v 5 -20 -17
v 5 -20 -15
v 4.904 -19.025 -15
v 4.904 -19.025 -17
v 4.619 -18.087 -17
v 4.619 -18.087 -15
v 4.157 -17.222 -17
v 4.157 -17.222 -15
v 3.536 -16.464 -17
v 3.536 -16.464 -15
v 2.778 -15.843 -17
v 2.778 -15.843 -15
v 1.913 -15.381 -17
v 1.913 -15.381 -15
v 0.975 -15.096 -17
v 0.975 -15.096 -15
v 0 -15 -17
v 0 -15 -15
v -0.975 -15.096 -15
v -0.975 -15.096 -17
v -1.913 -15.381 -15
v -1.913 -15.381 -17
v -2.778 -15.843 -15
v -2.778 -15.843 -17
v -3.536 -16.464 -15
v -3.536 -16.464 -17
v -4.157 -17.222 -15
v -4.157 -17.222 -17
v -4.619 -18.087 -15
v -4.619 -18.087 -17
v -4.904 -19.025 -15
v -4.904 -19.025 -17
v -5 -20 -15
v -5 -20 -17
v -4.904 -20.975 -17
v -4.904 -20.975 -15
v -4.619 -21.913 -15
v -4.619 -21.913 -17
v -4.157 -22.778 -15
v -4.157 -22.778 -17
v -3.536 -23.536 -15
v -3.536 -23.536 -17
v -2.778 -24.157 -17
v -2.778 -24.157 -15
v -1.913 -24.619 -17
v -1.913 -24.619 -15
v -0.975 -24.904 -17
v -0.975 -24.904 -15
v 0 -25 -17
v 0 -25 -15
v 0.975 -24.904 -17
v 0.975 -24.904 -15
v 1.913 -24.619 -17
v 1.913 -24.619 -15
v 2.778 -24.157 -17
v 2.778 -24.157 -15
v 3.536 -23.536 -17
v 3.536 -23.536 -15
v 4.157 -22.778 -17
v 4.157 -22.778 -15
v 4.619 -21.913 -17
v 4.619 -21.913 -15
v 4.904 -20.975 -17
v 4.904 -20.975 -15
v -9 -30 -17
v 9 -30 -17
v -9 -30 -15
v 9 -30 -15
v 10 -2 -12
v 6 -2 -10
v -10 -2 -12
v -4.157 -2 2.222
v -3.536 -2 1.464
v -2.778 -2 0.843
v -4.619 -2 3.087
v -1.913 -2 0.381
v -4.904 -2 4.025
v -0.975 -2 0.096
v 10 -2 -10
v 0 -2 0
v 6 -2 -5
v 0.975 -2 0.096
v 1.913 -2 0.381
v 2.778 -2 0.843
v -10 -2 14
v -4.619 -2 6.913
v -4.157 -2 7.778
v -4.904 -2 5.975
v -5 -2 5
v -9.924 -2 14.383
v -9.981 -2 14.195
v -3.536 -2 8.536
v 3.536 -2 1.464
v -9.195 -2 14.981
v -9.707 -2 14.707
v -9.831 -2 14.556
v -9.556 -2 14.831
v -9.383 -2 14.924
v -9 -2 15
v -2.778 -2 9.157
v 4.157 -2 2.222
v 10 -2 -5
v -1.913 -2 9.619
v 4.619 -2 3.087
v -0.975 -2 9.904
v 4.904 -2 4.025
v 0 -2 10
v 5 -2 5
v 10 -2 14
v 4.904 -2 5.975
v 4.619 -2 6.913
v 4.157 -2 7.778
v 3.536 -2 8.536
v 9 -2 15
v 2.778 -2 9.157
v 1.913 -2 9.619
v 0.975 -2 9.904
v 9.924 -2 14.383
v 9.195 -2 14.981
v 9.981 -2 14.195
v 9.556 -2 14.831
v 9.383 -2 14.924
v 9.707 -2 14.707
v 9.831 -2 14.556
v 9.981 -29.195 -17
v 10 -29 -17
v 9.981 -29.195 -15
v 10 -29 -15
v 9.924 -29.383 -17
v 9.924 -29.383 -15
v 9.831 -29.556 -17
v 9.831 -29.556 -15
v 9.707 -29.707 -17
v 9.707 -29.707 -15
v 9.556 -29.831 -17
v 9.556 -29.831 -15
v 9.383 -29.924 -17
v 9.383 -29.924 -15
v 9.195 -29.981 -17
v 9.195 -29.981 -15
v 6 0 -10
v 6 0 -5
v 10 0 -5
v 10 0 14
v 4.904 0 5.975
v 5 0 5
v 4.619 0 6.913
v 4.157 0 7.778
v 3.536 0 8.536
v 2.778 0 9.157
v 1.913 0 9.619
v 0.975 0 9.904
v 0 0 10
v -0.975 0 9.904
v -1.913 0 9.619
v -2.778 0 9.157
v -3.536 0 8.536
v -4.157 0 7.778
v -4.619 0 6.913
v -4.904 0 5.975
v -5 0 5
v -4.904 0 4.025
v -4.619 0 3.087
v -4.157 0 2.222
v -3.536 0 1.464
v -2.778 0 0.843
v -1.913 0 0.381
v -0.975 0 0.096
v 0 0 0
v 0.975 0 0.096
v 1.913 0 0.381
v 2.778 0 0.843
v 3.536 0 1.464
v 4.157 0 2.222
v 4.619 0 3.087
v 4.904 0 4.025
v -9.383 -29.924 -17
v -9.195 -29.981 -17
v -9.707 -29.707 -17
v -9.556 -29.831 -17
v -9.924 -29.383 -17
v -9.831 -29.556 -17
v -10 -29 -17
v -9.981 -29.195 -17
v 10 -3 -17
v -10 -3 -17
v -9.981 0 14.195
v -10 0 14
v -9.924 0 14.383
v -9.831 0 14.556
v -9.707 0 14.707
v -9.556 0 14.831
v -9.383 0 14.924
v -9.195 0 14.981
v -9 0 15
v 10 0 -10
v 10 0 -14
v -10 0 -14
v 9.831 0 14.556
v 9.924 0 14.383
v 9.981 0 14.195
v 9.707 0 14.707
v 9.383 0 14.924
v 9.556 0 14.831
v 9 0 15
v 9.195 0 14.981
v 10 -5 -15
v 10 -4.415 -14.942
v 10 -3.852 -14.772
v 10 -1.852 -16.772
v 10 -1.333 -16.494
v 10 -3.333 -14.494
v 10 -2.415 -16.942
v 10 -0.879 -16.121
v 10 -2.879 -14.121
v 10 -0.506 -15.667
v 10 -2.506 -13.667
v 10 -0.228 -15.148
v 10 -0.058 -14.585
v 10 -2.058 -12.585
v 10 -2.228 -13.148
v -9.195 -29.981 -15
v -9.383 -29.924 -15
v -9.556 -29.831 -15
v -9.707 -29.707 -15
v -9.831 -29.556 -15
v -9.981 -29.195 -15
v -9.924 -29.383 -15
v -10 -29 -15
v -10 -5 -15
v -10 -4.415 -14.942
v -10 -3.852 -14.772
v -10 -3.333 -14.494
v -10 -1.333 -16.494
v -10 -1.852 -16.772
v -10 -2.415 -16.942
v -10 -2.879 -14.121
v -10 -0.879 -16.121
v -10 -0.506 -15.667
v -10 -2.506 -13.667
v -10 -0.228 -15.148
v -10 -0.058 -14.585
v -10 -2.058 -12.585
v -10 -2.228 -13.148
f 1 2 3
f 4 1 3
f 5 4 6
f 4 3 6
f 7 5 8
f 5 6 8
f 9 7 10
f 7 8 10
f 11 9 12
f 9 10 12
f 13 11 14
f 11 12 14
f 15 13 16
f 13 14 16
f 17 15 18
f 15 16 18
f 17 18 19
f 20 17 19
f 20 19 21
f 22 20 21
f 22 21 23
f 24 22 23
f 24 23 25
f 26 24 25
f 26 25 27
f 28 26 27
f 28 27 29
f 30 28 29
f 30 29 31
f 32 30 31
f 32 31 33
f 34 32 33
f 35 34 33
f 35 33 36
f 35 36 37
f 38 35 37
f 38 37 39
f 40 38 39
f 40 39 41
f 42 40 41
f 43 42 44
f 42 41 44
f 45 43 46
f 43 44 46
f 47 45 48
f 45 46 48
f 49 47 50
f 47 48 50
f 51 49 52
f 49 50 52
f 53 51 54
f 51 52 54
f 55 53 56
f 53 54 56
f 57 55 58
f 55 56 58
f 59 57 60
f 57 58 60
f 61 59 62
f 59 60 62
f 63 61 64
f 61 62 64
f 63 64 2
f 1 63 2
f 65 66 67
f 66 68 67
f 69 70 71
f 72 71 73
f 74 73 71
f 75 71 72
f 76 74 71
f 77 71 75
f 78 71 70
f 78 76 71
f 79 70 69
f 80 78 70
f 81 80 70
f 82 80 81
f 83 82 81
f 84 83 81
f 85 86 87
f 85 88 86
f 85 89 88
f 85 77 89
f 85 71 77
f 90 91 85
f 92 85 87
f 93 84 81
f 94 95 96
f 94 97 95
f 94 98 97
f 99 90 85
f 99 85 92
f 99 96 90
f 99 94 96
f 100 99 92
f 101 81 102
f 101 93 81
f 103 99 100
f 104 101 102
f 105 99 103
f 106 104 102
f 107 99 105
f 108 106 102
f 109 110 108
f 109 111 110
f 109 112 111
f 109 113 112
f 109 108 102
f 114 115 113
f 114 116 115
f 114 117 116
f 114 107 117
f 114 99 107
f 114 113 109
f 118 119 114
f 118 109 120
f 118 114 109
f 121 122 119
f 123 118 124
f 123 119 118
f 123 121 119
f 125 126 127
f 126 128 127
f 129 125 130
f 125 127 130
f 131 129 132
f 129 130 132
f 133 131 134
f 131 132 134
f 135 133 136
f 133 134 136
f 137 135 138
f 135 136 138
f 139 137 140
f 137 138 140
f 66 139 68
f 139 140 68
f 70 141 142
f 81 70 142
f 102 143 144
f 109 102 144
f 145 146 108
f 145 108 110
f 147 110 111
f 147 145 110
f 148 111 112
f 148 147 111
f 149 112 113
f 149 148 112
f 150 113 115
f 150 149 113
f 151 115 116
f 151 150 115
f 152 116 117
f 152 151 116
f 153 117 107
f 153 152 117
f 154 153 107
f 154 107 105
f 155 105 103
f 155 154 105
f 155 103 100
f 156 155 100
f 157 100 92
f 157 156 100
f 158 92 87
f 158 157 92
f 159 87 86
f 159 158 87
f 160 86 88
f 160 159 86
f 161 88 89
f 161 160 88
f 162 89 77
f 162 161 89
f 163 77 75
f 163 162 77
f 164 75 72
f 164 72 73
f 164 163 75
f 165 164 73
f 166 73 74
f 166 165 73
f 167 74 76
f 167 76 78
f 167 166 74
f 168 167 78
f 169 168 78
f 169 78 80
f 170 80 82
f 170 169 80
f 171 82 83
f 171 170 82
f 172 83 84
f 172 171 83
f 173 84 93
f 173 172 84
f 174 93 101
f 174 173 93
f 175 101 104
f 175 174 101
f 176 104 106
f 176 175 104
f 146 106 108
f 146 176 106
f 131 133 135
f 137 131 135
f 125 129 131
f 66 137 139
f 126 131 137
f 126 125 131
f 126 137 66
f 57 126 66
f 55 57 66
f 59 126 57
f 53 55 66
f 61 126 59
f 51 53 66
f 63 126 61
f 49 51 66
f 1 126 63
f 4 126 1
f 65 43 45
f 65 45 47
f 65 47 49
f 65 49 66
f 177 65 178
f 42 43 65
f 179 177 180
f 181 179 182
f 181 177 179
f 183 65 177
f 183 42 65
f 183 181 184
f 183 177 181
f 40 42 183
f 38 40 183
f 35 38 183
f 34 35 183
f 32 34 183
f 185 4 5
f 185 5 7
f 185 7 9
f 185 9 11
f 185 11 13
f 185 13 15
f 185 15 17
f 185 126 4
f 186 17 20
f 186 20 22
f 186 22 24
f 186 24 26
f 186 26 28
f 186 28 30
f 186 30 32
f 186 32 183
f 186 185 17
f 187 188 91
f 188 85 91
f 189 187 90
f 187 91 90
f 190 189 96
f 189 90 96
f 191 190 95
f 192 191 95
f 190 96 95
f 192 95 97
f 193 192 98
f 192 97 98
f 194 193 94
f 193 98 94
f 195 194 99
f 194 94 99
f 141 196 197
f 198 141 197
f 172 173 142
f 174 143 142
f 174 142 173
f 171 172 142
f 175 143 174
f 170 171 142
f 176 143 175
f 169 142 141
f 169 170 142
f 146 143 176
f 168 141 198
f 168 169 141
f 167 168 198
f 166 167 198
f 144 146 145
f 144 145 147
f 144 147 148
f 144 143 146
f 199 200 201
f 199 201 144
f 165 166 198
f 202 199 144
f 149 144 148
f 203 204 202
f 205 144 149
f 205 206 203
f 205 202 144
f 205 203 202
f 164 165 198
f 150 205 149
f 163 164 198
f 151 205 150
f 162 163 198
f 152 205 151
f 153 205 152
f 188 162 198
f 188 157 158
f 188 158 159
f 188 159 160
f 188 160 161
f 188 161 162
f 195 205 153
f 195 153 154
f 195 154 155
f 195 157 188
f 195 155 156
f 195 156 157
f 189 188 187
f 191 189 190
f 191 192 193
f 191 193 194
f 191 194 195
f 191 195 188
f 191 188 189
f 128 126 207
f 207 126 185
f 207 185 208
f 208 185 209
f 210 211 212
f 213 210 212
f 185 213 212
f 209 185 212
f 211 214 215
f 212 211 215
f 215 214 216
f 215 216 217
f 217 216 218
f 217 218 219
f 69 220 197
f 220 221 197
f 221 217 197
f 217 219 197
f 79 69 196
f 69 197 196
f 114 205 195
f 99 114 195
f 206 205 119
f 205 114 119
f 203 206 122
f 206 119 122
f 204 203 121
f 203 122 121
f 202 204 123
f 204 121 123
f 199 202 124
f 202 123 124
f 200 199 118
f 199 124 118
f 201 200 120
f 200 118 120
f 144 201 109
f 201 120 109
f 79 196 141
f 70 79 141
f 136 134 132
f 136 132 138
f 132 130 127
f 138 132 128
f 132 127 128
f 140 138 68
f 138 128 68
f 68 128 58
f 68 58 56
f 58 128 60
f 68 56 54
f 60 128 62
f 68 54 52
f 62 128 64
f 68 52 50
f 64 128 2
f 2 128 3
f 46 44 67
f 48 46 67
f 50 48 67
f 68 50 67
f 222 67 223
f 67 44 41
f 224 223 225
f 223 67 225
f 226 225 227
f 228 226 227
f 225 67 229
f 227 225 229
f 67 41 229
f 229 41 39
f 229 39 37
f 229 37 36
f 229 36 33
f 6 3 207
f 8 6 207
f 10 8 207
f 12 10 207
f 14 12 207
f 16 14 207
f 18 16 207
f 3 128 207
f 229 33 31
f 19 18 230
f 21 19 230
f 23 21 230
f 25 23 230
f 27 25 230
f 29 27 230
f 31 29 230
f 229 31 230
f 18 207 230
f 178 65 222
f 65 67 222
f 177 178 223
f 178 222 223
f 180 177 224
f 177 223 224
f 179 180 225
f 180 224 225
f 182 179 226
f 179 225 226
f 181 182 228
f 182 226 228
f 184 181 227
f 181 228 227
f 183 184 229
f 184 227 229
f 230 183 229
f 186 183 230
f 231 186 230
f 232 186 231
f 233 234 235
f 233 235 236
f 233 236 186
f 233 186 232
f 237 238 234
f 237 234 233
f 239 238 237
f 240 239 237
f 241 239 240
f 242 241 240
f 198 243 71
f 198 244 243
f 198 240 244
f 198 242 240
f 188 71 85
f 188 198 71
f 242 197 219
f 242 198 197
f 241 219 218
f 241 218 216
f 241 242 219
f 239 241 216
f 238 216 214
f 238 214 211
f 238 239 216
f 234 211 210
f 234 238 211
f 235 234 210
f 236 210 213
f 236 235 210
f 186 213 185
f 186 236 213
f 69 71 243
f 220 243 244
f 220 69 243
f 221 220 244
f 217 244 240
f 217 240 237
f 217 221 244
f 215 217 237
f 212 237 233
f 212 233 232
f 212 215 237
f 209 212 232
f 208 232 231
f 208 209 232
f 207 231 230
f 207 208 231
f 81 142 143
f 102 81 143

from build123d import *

# Parameters (mm, degrees)
F0_R     = 5
F1_DEPTH = 2
F2_W     = 20
F2_H     = 2
F3_DEPTH = 30
F4_R     = 3
F5_R     = 5
F6_DEPTH = 2.001
F7_R     = 1


with BuildPart() as f1:
    # F0 (on Front) → F1 (new body)
    with BuildSketch(Plane.XZ):
        Polygon((10, 15), (-10, 15), (-10, -15), (10, -15), (10, -10), (6, -10), (6, -5), (10, -5), align=None)
        with Locations((0, 5)):
            Circle(F0_R, mode=Mode.SUBTRACT)
    extrude(amount=F1_DEPTH)

    # F2 (on face) → F3 (join)
    with BuildSketch(Plane(origin=(0, 0, 0), x_dir=(-1, 0, 0), z_dir=(0, 1, 0))):
        with Locations((0, -16)):
            Rectangle(F2_W, F2_H)
    extrude(amount=-F3_DEPTH)

    # F4
    f4_edges = [f1.edges().sort_by_distance(p)[0] for p in [
        (0, -2, -15),
        (0, 0, -17),
    ]]
    fillet(f4_edges, radius=F4_R)

    # F5 (on face) → F6 (cut, through all)
    with BuildSketch(Plane.XY.offset(-15)):
        with Locations((0, -20)):
            Circle(F5_R)
    extrude(amount=-F6_DEPTH, mode=Mode.SUBTRACT)

    # F7
    f7_edges = [f1.edges().sort_by_distance(p)[0] for p in [
        (-10, -1, 15),
        (10, -1, 15),
        (-10, -30, -16),
        (10, -30, -16),
    ]]
    fillet(f7_edges, radius=F7_R)


solid = f1.part
